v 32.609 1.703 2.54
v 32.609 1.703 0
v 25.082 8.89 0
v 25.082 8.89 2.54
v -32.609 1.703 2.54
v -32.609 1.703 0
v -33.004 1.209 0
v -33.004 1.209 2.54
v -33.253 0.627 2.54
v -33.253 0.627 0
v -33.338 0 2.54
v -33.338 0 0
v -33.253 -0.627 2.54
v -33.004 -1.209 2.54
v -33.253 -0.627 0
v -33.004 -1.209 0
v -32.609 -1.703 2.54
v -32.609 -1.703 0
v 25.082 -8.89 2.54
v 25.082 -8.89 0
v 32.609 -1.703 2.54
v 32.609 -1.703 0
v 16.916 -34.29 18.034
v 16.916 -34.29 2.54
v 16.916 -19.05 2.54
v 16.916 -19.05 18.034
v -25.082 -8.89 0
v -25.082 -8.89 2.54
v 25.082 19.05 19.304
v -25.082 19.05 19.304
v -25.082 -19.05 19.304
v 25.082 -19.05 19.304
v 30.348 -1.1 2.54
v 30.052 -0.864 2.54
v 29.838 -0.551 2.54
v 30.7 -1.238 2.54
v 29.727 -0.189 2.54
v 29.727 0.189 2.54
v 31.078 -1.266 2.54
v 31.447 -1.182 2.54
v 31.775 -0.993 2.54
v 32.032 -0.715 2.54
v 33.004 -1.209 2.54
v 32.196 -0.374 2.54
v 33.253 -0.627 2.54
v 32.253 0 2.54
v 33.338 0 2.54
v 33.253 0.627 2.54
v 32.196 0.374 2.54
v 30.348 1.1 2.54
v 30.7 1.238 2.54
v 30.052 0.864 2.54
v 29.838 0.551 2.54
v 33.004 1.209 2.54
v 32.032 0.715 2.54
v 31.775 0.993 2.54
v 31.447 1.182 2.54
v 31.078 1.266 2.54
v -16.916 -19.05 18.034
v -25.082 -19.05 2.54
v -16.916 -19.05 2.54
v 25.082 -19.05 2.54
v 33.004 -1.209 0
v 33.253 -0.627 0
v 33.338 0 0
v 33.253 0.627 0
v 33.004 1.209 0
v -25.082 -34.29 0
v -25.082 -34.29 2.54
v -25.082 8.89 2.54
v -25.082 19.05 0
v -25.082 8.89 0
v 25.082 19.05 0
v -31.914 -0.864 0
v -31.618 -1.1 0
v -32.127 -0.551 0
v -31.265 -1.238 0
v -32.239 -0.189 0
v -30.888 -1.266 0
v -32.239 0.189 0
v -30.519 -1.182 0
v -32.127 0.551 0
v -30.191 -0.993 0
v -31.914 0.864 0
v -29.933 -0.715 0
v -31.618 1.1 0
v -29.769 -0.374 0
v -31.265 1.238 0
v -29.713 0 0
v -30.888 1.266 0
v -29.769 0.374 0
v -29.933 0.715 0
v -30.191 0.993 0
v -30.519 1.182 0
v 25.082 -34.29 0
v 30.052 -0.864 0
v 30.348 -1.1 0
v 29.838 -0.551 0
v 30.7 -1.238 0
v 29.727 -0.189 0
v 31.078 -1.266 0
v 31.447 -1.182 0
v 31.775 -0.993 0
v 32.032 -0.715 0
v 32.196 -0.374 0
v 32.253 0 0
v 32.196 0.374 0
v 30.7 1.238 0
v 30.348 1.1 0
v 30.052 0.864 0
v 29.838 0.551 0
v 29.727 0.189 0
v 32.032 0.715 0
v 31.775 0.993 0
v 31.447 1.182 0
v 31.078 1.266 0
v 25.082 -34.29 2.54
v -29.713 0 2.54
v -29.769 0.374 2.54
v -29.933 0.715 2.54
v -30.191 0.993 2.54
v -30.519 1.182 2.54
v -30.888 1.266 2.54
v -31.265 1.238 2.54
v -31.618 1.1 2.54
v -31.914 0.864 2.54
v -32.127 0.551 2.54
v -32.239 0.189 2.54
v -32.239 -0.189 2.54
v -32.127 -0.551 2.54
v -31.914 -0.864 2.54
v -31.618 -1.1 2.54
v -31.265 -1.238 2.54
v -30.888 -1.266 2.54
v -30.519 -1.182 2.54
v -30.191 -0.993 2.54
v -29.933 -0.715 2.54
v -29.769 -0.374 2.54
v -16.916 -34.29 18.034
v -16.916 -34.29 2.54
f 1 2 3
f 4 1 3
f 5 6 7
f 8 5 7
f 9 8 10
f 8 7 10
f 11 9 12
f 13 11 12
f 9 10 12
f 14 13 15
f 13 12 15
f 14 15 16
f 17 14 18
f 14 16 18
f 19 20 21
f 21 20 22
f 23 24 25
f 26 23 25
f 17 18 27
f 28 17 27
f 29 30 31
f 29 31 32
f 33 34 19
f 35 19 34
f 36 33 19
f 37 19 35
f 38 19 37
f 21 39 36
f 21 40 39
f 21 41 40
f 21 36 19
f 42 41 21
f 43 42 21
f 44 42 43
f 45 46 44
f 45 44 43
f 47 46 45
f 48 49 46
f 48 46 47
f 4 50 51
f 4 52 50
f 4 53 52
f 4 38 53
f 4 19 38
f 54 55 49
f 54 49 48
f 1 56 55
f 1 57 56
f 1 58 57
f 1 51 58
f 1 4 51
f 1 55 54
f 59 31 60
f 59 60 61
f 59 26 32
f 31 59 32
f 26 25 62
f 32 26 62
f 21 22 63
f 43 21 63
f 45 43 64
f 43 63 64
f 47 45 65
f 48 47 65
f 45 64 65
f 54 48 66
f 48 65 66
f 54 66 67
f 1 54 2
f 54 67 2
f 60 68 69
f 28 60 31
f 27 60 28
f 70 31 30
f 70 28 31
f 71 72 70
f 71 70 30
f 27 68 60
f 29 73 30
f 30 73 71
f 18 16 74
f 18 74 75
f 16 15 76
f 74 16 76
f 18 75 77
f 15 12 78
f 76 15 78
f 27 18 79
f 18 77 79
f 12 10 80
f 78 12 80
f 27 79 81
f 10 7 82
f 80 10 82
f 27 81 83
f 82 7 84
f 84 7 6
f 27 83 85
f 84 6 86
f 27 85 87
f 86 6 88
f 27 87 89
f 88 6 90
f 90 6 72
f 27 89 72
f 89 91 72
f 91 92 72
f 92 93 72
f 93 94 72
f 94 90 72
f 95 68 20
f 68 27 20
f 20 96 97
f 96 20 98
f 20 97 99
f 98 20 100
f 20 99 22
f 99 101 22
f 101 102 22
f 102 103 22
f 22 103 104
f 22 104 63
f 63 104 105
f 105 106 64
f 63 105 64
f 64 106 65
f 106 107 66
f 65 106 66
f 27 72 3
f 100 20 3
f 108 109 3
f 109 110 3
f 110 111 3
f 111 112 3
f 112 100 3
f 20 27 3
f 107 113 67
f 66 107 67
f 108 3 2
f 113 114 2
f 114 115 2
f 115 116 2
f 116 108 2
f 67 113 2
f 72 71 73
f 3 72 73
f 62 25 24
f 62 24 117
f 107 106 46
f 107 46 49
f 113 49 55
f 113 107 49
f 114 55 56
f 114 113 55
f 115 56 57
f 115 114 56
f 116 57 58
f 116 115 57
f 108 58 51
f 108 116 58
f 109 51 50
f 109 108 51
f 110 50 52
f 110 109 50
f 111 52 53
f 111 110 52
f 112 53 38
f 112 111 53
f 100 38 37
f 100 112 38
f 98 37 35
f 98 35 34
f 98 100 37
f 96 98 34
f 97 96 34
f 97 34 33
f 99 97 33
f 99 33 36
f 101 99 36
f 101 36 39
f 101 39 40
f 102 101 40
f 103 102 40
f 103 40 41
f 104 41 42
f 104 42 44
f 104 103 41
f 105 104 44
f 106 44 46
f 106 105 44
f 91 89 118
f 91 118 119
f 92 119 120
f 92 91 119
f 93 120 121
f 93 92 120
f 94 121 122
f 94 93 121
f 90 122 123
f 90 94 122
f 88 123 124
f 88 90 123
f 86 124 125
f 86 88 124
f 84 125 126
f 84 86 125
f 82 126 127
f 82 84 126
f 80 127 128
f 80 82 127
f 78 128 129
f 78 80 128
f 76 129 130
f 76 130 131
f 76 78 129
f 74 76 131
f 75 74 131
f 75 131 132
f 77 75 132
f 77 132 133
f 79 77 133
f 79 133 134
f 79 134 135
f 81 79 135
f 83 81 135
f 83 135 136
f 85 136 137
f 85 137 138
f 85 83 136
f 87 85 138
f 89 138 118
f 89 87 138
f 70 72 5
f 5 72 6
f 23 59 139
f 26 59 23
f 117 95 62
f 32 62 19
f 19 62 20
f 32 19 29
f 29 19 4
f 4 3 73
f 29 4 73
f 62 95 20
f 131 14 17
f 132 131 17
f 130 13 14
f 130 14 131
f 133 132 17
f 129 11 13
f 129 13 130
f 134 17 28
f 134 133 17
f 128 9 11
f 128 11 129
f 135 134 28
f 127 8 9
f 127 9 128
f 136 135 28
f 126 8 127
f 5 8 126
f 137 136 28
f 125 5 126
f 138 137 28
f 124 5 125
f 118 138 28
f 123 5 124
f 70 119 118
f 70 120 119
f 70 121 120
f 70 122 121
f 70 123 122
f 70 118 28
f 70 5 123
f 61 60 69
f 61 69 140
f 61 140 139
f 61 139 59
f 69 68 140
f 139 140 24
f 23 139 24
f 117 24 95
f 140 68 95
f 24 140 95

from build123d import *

# Parameters (mm, degrees)
F1_DEPTH = 19.304
F0_W     = 33.8328
F0_H     = 15.24
F2_DEPTH = 18.034
F0_W_2   = 8.1661
F0_R     = 1.27
F3_DEPTH = 2.54


with BuildPart() as f1:
    # F0 (on Top) → F1 (new body)
    with BuildSketch(Plane.XY):
        Polygon((25.0825, 8.89), (25.0825, 19.05), (-25.0825, 19.05), (-25.0825, 8.89), (-25.0825, -8.89), (-25.0825, -19.05), (-16.9164, -19.05), (16.9164, -19.05), (25.0825, -19.05), (25.0825, -8.89), align=None)
    extrude(amount=F1_DEPTH)

    # F0 (on Top) → F2 (join, through all)
    with BuildSketch(Plane.XY):
        with Locations((0, -26.67)):
            Rectangle(F0_W, F0_H)
    extrude(amount=F2_DEPTH)

    # F0 (on Top) → F3 (join)
    with BuildSketch(Plane.XY):
        with Locations((-20.99945, -26.67)):
            Rectangle(F0_W_2, F0_H)
        with Locations((20.99945, -26.67)):
            Rectangle(F0_W_2, F0_H)
        with BuildLine():
            Line((-25.0825, -8.89), (-25.0825, 8.89))
            Line((-25.0825, 8.89), (-32.608938648, 1.7030678618))
            ThreePointArc((-32.608938648, 1.7030678618), (-33.3375, 0), (-32.608938648, -1.7030678618))
            Line((-32.608938648, -1.7030678618), (-25.0825, -8.89))
        make_face()
        with Locations((-30.9826936573, 0)):
            Circle(F0_R, mode=Mode.SUBTRACT)
        with BuildLine():
            Line((32.608938648, 1.7030678618), (25.0825, 8.89))
            Line((25.0825, 8.89), (25.0825, -8.89))
            Line((25.0825, -8.89), (32.608938648, -1.7030678618))
            ThreePointArc((32.608938648, -1.7030678618), (33.3375, 0), (32.608938648, 1.7030678618))
        make_face()
        with Locations((30.9826936573, 0)):
            Circle(F0_R, mode=Mode.SUBTRACT)
    extrude(amount=F3_DEPTH)


solid = f1.part
